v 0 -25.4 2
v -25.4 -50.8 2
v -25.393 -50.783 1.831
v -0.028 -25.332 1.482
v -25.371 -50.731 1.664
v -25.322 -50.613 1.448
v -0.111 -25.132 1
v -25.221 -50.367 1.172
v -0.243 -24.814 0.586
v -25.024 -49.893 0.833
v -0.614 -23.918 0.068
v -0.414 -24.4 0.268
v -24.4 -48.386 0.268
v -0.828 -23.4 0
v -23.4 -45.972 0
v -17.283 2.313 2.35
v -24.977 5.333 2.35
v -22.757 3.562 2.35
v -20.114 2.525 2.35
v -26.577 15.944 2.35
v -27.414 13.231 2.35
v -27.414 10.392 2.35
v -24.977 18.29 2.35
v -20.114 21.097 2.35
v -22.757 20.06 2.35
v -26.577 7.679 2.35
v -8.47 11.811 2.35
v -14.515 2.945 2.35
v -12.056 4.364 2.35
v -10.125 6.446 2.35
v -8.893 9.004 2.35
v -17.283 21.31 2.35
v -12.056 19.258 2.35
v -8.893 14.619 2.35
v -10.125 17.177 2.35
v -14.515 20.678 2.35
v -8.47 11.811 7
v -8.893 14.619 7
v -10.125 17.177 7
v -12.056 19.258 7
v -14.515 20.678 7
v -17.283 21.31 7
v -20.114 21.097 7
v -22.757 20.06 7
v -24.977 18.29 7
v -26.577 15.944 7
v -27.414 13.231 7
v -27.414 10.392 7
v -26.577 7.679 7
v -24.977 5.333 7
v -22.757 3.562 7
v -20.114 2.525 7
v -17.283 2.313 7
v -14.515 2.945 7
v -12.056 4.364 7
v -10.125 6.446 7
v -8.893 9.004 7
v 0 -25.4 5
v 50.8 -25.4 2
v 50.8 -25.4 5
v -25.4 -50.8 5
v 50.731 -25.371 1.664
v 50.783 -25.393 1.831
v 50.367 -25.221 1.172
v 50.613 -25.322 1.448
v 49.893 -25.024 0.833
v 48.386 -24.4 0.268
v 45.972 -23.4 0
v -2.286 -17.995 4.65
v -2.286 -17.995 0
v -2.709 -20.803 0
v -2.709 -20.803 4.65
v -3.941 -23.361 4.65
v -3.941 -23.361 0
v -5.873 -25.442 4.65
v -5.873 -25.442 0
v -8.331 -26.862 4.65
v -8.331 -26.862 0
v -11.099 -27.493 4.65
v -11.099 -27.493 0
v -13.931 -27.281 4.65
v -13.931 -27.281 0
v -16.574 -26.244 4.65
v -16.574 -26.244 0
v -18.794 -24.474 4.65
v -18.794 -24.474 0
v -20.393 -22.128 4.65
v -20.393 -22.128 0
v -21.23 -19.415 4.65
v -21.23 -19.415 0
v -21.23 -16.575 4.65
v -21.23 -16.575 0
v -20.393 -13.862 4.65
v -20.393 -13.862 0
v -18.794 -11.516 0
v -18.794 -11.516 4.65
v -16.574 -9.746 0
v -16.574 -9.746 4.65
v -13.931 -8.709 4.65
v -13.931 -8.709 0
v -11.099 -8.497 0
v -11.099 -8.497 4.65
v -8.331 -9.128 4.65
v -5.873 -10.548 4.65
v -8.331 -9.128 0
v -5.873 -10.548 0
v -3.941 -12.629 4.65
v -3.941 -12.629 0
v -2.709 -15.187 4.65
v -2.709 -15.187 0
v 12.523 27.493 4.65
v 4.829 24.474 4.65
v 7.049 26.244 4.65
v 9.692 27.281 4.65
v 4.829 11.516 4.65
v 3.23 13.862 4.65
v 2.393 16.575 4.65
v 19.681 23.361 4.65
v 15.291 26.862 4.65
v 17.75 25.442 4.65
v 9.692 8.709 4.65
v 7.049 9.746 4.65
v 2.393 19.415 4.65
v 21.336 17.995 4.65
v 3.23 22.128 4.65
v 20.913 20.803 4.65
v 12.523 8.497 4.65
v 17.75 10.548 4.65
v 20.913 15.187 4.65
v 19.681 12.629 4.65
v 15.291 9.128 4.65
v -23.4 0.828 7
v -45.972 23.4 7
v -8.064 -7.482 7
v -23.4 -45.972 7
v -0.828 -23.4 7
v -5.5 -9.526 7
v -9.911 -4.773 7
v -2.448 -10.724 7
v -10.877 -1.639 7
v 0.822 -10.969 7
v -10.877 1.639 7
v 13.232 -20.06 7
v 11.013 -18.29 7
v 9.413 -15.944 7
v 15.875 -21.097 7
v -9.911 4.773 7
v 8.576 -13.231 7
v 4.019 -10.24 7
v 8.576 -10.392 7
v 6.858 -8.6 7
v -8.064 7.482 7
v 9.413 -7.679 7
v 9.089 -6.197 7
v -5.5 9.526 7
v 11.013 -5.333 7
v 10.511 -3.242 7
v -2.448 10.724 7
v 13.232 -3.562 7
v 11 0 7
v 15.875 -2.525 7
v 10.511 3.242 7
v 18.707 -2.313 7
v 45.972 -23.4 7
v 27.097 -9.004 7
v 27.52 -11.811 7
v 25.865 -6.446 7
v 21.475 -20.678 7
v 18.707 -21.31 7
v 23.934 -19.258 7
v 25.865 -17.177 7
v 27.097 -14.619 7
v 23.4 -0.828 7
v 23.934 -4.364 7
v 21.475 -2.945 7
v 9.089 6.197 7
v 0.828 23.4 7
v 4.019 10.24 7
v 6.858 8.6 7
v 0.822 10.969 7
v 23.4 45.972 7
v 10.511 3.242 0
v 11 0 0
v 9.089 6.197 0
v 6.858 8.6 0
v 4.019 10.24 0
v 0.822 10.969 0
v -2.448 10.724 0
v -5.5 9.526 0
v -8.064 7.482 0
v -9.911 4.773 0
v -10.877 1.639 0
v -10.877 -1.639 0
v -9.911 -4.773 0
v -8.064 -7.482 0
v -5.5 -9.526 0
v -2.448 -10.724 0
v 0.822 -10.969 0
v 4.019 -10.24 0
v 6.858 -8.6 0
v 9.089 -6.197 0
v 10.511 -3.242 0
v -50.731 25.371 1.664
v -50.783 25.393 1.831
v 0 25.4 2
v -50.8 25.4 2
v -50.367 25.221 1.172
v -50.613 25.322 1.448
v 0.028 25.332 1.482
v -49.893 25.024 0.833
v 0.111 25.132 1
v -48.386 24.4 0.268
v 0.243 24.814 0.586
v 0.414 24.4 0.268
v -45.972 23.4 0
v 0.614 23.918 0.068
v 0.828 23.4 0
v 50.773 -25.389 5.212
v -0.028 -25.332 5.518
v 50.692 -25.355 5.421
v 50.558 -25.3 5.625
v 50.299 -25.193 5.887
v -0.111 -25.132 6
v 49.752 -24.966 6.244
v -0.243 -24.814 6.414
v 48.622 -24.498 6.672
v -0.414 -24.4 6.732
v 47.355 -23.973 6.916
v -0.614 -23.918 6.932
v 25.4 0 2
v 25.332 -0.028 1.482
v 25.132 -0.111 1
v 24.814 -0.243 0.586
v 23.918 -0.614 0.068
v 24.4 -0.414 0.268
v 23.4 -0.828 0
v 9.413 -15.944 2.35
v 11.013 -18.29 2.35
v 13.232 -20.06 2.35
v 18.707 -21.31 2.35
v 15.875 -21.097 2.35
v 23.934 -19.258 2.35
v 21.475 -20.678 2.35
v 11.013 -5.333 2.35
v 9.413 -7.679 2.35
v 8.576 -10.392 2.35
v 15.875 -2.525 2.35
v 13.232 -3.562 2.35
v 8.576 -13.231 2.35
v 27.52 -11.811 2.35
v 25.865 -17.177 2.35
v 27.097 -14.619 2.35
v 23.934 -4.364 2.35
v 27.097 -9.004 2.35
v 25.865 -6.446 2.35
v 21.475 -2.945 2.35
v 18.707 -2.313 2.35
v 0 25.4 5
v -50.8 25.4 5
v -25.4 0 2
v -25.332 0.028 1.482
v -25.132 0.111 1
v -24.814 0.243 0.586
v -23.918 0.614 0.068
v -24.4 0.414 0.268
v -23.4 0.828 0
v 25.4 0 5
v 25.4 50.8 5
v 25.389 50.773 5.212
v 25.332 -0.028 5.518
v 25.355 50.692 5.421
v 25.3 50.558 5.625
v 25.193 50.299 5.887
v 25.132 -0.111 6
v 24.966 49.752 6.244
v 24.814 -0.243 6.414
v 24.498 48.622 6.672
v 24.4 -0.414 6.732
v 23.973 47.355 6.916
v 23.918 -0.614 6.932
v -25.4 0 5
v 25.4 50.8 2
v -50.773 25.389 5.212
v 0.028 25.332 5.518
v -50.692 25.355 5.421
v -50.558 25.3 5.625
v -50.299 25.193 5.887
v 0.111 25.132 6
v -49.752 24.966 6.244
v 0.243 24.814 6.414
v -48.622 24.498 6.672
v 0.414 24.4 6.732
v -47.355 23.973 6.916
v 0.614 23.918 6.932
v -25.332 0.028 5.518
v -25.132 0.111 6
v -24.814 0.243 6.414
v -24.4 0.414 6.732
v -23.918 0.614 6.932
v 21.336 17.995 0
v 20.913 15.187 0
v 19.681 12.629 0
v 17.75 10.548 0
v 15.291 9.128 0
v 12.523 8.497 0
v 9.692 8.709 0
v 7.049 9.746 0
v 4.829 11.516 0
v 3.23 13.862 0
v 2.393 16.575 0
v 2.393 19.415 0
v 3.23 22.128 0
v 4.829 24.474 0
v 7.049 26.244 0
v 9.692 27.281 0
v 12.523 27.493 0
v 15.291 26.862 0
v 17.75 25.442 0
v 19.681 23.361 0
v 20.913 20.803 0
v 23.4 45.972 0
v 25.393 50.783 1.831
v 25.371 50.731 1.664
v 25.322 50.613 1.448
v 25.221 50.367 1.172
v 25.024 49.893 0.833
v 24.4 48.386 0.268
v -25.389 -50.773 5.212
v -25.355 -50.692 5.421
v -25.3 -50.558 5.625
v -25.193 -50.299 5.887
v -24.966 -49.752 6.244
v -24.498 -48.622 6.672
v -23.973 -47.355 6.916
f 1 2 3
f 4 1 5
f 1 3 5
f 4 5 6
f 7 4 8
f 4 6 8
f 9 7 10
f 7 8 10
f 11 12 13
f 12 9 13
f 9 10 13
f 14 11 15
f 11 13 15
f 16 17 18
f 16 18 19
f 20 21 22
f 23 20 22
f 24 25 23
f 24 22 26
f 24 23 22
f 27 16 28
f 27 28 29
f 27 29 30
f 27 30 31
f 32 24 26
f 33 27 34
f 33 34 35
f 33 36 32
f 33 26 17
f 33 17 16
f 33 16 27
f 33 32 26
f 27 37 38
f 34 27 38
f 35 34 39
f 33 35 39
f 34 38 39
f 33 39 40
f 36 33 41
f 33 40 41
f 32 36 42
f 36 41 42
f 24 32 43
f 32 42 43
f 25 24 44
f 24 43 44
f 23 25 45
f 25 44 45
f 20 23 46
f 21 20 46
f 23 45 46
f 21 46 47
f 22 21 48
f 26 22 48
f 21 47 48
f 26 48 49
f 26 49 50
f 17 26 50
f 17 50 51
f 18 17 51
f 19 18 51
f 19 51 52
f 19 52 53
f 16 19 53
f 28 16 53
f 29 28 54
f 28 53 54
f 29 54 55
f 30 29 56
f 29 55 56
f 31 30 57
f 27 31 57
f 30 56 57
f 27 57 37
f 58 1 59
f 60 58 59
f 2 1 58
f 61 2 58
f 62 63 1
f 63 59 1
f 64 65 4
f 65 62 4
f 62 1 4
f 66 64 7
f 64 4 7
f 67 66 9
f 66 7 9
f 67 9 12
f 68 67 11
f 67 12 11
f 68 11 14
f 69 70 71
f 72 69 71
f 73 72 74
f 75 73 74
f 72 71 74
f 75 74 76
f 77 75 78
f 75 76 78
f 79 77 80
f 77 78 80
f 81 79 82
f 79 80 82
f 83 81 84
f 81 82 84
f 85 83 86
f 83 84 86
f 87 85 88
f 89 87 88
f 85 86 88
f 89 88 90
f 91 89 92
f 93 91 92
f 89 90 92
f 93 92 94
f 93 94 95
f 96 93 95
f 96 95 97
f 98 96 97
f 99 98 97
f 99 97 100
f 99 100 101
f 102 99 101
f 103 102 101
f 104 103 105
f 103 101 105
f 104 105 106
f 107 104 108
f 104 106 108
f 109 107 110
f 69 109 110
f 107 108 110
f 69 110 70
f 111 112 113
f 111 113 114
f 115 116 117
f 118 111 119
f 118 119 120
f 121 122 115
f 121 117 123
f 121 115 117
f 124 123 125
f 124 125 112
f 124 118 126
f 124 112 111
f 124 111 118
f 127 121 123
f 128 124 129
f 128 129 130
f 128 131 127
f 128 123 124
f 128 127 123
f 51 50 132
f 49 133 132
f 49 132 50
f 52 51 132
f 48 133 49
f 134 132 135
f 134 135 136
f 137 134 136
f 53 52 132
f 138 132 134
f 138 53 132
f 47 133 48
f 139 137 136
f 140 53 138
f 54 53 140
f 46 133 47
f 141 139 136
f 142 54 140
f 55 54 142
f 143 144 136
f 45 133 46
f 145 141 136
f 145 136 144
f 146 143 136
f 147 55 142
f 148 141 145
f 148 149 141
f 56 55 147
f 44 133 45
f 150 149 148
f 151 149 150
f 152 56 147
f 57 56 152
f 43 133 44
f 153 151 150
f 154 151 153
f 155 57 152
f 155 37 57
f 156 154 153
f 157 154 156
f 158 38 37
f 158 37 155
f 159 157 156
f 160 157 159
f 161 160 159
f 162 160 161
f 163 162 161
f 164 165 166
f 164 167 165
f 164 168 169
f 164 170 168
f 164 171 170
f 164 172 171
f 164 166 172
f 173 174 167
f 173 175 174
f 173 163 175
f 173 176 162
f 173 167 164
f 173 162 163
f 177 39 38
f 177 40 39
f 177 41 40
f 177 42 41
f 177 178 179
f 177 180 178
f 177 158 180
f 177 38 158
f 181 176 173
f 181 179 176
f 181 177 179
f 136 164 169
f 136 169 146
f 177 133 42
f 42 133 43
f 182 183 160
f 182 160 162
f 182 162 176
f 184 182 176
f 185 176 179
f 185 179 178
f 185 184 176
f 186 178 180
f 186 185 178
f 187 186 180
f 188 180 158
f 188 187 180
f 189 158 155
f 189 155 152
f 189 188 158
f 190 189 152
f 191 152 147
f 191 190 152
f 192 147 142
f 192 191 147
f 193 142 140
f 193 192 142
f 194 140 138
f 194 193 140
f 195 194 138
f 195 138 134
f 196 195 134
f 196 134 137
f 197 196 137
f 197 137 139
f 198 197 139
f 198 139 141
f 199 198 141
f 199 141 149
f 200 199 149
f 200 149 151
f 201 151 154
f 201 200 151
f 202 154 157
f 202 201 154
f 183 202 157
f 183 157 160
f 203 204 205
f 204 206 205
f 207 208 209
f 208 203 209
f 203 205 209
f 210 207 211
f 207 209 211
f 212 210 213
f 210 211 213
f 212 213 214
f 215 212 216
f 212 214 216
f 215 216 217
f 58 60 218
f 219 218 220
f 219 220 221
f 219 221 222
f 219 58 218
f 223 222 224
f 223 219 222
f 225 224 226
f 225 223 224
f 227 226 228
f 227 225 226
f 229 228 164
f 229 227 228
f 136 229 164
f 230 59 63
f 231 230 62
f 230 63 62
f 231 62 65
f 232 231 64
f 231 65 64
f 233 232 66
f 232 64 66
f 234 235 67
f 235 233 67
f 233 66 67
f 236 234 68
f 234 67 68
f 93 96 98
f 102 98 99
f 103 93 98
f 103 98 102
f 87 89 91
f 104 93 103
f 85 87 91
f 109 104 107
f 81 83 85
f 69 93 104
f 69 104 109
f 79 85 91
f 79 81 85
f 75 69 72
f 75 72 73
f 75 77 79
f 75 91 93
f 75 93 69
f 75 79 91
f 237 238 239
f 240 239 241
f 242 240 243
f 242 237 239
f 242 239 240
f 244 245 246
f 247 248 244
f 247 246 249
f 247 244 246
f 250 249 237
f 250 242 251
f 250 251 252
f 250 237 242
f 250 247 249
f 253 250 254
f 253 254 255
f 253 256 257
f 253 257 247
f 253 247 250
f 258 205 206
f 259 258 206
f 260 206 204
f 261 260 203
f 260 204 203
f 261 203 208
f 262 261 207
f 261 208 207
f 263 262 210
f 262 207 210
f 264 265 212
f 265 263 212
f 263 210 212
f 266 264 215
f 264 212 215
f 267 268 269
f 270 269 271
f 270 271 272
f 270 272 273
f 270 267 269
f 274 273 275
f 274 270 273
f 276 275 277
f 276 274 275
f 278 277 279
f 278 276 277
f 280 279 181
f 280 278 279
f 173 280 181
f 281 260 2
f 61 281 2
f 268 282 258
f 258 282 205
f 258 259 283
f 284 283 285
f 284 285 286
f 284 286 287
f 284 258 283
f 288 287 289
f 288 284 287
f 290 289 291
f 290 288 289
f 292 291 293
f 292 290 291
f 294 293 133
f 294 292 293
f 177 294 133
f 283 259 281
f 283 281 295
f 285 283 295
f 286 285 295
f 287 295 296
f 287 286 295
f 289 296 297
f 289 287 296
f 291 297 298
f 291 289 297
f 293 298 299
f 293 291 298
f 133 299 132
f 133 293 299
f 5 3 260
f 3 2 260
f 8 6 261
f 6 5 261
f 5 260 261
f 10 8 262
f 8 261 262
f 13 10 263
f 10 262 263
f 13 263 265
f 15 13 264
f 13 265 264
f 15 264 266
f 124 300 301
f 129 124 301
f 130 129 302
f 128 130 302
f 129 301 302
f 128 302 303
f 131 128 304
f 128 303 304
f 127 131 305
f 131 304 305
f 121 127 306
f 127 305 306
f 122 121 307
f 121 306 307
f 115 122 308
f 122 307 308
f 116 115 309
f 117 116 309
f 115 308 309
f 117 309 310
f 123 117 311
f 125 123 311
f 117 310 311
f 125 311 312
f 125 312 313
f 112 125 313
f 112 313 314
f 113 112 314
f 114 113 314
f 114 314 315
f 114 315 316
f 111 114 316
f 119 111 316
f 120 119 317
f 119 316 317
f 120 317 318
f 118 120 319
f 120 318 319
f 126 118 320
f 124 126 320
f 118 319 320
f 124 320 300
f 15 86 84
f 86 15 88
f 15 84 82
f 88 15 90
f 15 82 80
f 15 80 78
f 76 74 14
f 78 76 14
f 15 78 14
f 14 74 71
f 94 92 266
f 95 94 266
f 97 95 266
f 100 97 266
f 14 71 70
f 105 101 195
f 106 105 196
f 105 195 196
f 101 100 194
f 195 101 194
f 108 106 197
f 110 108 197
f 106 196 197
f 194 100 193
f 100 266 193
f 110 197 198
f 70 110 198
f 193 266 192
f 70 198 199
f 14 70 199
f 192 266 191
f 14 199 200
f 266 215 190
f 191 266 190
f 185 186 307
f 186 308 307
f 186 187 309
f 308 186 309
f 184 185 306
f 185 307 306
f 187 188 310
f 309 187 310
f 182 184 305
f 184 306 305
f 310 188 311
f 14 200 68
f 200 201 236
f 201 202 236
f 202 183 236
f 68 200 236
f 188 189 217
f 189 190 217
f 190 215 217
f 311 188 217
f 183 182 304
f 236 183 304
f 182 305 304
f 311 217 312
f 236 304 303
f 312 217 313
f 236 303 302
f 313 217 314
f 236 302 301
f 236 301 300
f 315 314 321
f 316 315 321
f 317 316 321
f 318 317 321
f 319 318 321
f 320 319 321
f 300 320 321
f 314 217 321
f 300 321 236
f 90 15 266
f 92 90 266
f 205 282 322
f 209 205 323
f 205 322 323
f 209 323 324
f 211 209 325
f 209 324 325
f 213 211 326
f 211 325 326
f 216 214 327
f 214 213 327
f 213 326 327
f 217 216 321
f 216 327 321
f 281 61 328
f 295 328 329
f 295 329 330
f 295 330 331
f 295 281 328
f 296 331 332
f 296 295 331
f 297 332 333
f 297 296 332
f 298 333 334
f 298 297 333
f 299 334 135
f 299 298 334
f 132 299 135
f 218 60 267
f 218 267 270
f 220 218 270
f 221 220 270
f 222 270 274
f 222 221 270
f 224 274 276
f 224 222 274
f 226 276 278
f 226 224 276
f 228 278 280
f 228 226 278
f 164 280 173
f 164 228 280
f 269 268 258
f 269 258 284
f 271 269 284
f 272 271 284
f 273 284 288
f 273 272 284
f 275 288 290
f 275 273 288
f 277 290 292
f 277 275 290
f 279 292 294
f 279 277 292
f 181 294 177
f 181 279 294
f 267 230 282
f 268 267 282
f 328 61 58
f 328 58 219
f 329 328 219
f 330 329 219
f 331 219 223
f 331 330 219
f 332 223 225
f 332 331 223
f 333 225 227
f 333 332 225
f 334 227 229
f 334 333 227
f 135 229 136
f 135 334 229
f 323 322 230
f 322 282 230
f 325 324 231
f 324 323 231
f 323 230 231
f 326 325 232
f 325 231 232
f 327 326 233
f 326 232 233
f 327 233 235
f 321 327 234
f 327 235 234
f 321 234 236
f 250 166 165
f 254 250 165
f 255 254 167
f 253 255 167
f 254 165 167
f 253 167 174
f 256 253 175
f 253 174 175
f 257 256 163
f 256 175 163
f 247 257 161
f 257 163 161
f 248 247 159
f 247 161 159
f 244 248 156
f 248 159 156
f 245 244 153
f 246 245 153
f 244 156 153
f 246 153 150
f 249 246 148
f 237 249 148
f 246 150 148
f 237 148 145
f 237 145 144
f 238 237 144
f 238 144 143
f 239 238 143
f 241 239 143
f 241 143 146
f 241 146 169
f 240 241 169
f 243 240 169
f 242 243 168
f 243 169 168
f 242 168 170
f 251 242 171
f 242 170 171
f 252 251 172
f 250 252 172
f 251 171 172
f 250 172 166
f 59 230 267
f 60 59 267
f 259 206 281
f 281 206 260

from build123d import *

# Parameters (mm, degrees)
F0_R          = 11
F1_DEPTH      = 7
F2_T4_DEPTH   = 60.8
F2_T9_DEPTH   = 45.9210244843
F2_T14_DEPTH  = 45.9210244843
F2_T19_DEPTH  = 60.8
F2_T24_DEPTH  = 45.9210244843
F2_T29_DEPTH  = 60.8
F2_T34_DEPTH  = 45.9210244843
F2_T39_DEPTH  = 60.8
F2_T44_DEPTH  = 60.8
F2_T49_DEPTH  = 45.9210244843
F2_T54_DEPTH  = 60.8
F2_T59_DEPTH  = 45.9210244843
F2_T64_DEPTH  = 60.8
F2_T69_DEPTH  = 45.9210244843
F2_T74_DEPTH  = 60.8
F2_T79_DEPTH  = 45.9210244843
F2_T85_DEPTH  = 60.8
F2_T89_DEPTH  = 45.9210244843
F2_T96_DEPTH  = 45.9210244843
F2_T100_DEPTH = 60.8
F2_T107_DEPTH = 45.9210244843
F2_T111_DEPTH = 60.8
F2_T118_DEPTH = 45.9210244843
F2_T122_DEPTH = 60.8
F2_T129_DEPTH = 60.8
F2_T133_DEPTH = 45.9210244843
F2_T140_DEPTH = 45.9210244843
F2_T144_DEPTH = 60.8
F2_T151_DEPTH = 45.9210244843
F2_T155_DEPTH = 60.8
F2_T162_DEPTH = 45.9210244843
F2_T166_DEPTH = 60.8
F3_R          = 9.525
F4_DEPTH      = 4.65
F5_R          = 9.525
F6_DEPTH      = 4.65
F7_R          = 9.525
F8_DEPTH      = 4.65
F9_R          = 9.525
F10_DEPTH     = 4.65


# Not quite as in the source:
# - a fillet or chamfer that OpenCascade refuses, or shapes differently, is made with other operations: its cross-section is extruded or revolved along the edge and cut away or added


with BuildPart() as f1:
    # F0 (on Top) → F1 (new body)
    with BuildSketch(Plane.XY):
        Polygon((-25.4, -50.8), (0, -25.4), (-25.4, -25.4), align=None)
        Polygon((25.4, 0), (25.4, 25.4), (0, 25.4), (-25.4, 25.4), (-25.4, 0), (-25.4, -25.4), (0, -25.4), (25.4, -25.4), align=None)
        Circle(F0_R, mode=Mode.SUBTRACT)
        Polygon((0, 25.4), (25.4, 25.4), (25.4, 50.8), align=None)
        Polygon((50.8, -25.4), (25.4, 0), (25.4, -25.4), align=None)
        Polygon((-25.4, 0), (-25.4, 25.4), (-50.8, 25.4), align=None)
    extrude(amount=F1_DEPTH)

    # F2: fillet of radius 2 on 20 edges, made by hand


with BuildPart() as f2_tool2:
    # F2_s3 → F2_t4 (new body)
    with BuildSketch(Plane.YZ.offset(5)):
        with BuildLine():
            ThreePointArc((25.4, 5), (24.8142135624, 6.4142135624), (23.4, 7))
            Line((23.4, 7), (25.4, 7))
            Line((25.4, 7), (25.4, 5))
        make_face()
    extrude(amount=-F2_T4_DEPTH)

    split(bisect_by=Plane(origin=(-12.7, 12.7, 0), x_dir=(0, 0, 1), z_dir=(-0.7071067812, 0.7071067812, 0)), keep=Keep.TOP)


with BuildPart() as f1_1:
    add(f1.part)

    # F2_t1: cut F2_tool2
    add(f2_tool2.part, mode=Mode.SUBTRACT)


with BuildPart() as f2_tool7:
    # F2_s8 → F2_t9 (new body)
    with BuildSketch(Plane(origin=(41.6355339059, 41.6355339059, 0), x_dir=(0, 0, 1), z_dir=(-0.7071067812, -0.7071067812, 0))):
        with BuildLine():
            ThreePointArc((5, 17.9605122421), (6.4142135624, 17.3747258045), (7, 15.9605122421))
            Line((7, 15.9605122421), (7, 17.9605122421))
            Line((7, 17.9605122421), (5, 17.9605122421))
        make_face()
    extrude(amount=F2_T9_DEPTH)

    split(bisect_by=Plane.XZ.offset(-25.4), keep=Keep.BOTTOM)


with BuildPart() as f1_2:
    add(f1_1.part)

    # F2_t6: cut F2_tool7
    add(f2_tool7.part, mode=Mode.SUBTRACT)


with BuildPart() as f2_tool12:
    # F2_s13 → F2_t14 (new body)
    with BuildSketch(Plane(origin=(-41.6355339059, 41.6355339059, 0), x_dir=(0, 0, 1), z_dir=(0.7071067812, -0.7071067812, 0))):
        with BuildLine():
            ThreePointArc((5, 17.9605122421), (6.4142135624, 17.3747258045), (7, 15.9605122421))
            Line((7, 15.9605122421), (7, 17.9605122421))
            Line((7, 17.9605122421), (5, 17.9605122421))
        make_face()
    extrude(amount=F2_T14_DEPTH)

    split(bisect_by=Plane.YZ.offset(-25.4), keep=Keep.BOTTOM)


with BuildPart() as f1_3:
    add(f1_2.part)

    # F2_t11: cut F2_tool12
    add(f2_tool12.part, mode=Mode.SUBTRACT)


with BuildPart() as f2_tool17:
    # F2_s18 → F2_t19 (new body)
    with BuildSketch(Plane.XZ.offset(-5)):
        with BuildLine():
            ThreePointArc((-25.4, 5), (-24.8142135624, 6.4142135624), (-23.4, 7))
            Line((-23.4, 7), (-25.4, 7))
            Line((-25.4, 7), (-25.4, 5))
        make_face()
    extrude(amount=F2_T19_DEPTH)

    split(bisect_by=Plane(origin=(-12.7, -12.7, 0), x_dir=(0, 0, 1), z_dir=(-0.7071067812, -0.7071067812, 0)), keep=Keep.TOP)


with BuildPart() as f1_4:
    add(f1_3.part)

    # F2_t16: cut F2_tool17
    add(f2_tool17.part, mode=Mode.SUBTRACT)


with BuildPart() as f2_tool22:
    # F2_s23 → F2_t24 (new body)
    with BuildSketch(Plane(origin=(-41.6355339059, -41.6355339059, 0), x_dir=(0, 0, 1), z_dir=(0.7071067812, 0.7071067812, 0))):
        with BuildLine():
            ThreePointArc((5, 17.9605122421), (6.4142135624, 17.3747258045), (7, 15.9605122421))
            Line((7, 15.9605122421), (7, 17.9605122421))
            Line((7, 17.9605122421), (5, 17.9605122421))
        make_face()
    extrude(amount=F2_T24_DEPTH)

    split(bisect_by=Plane.XZ.offset(25.4), keep=Keep.TOP)


with BuildPart() as f1_5:
    add(f1_4.part)

    # F2_t21: cut F2_tool22
    add(f2_tool22.part, mode=Mode.SUBTRACT)


with BuildPart() as f2_tool27:
    # F2_s28 → F2_t29 (new body)
    with BuildSketch(Plane.YZ.offset(-5)):
        with BuildLine():
            ThreePointArc((-25.4, 5), (-24.8142135624, 6.4142135624), (-23.4, 7))
            Line((-23.4, 7), (-25.4, 7))
            Line((-25.4, 7), (-25.4, 5))
        make_face()
    extrude(amount=F2_T29_DEPTH)

    split(bisect_by=Plane(origin=(12.7, -12.7, 0), x_dir=(0, 0, 1), z_dir=(0.7071067812, -0.7071067812, 0)), keep=Keep.TOP)


with BuildPart() as f1_6:
    add(f1_5.part)

    # F2_t26: cut F2_tool27
    add(f2_tool27.part, mode=Mode.SUBTRACT)


with BuildPart() as f2_tool32:
    # F2_s33 → F2_t34 (new body)
    with BuildSketch(Plane(origin=(41.6355339059, -41.6355339059, 0), x_dir=(0, 0, 1), z_dir=(-0.7071067812, 0.7071067812, 0))):
        with BuildLine():
            ThreePointArc((5, 17.9605122421), (6.4142135624, 17.3747258045), (7, 15.9605122421))
            Line((7, 15.9605122421), (7, 17.9605122421))
            Line((7, 17.9605122421), (5, 17.9605122421))
        make_face()
    extrude(amount=F2_T34_DEPTH)

    split(bisect_by=Plane.YZ.offset(25.4), keep=Keep.TOP)


with BuildPart() as f1_7:
    add(f1_6.part)

    # F2_t31: cut F2_tool32
    add(f2_tool32.part, mode=Mode.SUBTRACT)


with BuildPart() as f2_tool37:
    # F2_s38 → F2_t39 (new body)
    with BuildSketch(Plane.XZ.offset(5)):
        with BuildLine():
            ThreePointArc((25.4, 5), (24.8142135624, 6.4142135624), (23.4, 7))
            Line((23.4, 7), (25.4, 7))
            Line((25.4, 7), (25.4, 5))
        make_face()
    extrude(amount=-F2_T39_DEPTH)

    split(bisect_by=Plane(origin=(12.7, 12.7, 0), x_dir=(0, 0, 1), z_dir=(0.7071067812, 0.7071067812, 0)), keep=Keep.TOP)


with BuildPart() as f1_8:
    add(f1_7.part)

    # F2_t36: cut F2_tool37
    add(f2_tool37.part, mode=Mode.SUBTRACT)


with BuildPart() as f2_tool42:
    # F2_s43 → F2_t44 (new body)
    with BuildSketch(Plane.YZ.offset(5)):
        with BuildLine():
            ThreePointArc((25.4, 2), (24.8142135624, 0.5857864376), (23.4, 0))
            Line((23.4, 0), (25.4, 0))
            Line((25.4, 0), (25.4, 2))
        make_face()
    extrude(amount=-F2_T44_DEPTH)

    split(bisect_by=Plane(origin=(-12.7, 12.7, 0), x_dir=(0, 0, 1), z_dir=(-0.7071067812, 0.7071067812, 0)), keep=Keep.TOP)


with BuildPart() as f1_9:
    add(f1_8.part)

    # F2_t41: cut F2_tool42
    add(f2_tool42.part, mode=Mode.SUBTRACT)


with BuildPart() as f2_tool47:
    # F2_s48 → F2_t49 (new body)
    with BuildSketch(Plane(origin=(41.6355339059, 41.6355339059, 0), x_dir=(0, 0, 1), z_dir=(-0.7071067812, -0.7071067812, 0))):
        with BuildLine():
            ThreePointArc((2, 17.9605122421), (0.5857864376, 17.3747258045), (0, 15.9605122421))
            Line((0, 15.9605122421), (0, 17.9605122421))
            Line((0, 17.9605122421), (2, 17.9605122421))
        make_face()
    extrude(amount=F2_T49_DEPTH)

    split(bisect_by=Plane.XZ.offset(-25.4), keep=Keep.BOTTOM)


with BuildPart() as f1_10:
    add(f1_9.part)

    # F2_t46: cut F2_tool47
    add(f2_tool47.part, mode=Mode.SUBTRACT)


with BuildPart() as f2_tool52:
    # F2_s53 → F2_t54 (new body)
    with BuildSketch(Plane.XZ.offset(5)):
        with BuildLine():
            ThreePointArc((25.4, 2), (24.8142135624, 0.5857864376), (23.4, 0))
            Line((23.4, 0), (25.4, 0))
            Line((25.4, 0), (25.4, 2))
        make_face()
    extrude(amount=-F2_T54_DEPTH)

    split(bisect_by=Plane(origin=(12.7, 12.7, 0), x_dir=(0, 0, 1), z_dir=(0.7071067812, 0.7071067812, 0)), keep=Keep.TOP)


with BuildPart() as f1_11:
    add(f1_10.part)

    # F2_t51: cut F2_tool52
    add(f2_tool52.part, mode=Mode.SUBTRACT)


with BuildPart() as f2_tool57:
    # F2_s58 → F2_t59 (new body)
    with BuildSketch(Plane(origin=(41.6355339059, -41.6355339059, 0), x_dir=(0, 0, 1), z_dir=(-0.7071067812, 0.7071067812, 0))):
        with BuildLine():
            ThreePointArc((2, 17.9605122421), (0.5857864376, 17.3747258045), (0, 15.9605122421))
            Line((0, 15.9605122421), (0, 17.9605122421))
            Line((0, 17.9605122421), (2, 17.9605122421))
        make_face()
    extrude(amount=F2_T59_DEPTH)

    split(bisect_by=Plane.YZ.offset(25.4), keep=Keep.TOP)


with BuildPart() as f1_12:
    add(f1_11.part)

    # F2_t56: cut F2_tool57
    add(f2_tool57.part, mode=Mode.SUBTRACT)


with BuildPart() as f2_tool62:
    # F2_s63 → F2_t64 (new body)
    with BuildSketch(Plane.YZ.offset(-5)):
        with BuildLine():
            ThreePointArc((-25.4, 2), (-24.8142135624, 0.5857864376), (-23.4, 0))
            Line((-23.4, 0), (-25.4, 0))
            Line((-25.4, 0), (-25.4, 2))
        make_face()
    extrude(amount=F2_T64_DEPTH)

    split(bisect_by=Plane(origin=(12.7, -12.7, 0), x_dir=(0, 0, 1), z_dir=(0.7071067812, -0.7071067812, 0)), keep=Keep.TOP)


with BuildPart() as f1_13:
    add(f1_12.part)

    # F2_t61: cut F2_tool62
    add(f2_tool62.part, mode=Mode.SUBTRACT)


with BuildPart() as f2_tool67:
    # F2_s68 → F2_t69 (new body)
    with BuildSketch(Plane(origin=(-41.6355339059, -41.6355339059, 0), x_dir=(0, 0, 1), z_dir=(0.7071067812, 0.7071067812, 0))):
        with BuildLine():
            ThreePointArc((2, 17.9605122421), (0.5857864376, 17.3747258045), (0, 15.9605122421))
            Line((0, 15.9605122421), (0, 17.9605122421))
            Line((0, 17.9605122421), (2, 17.9605122421))
        make_face()
    extrude(amount=F2_T69_DEPTH)

    split(bisect_by=Plane.XZ.offset(25.4), keep=Keep.TOP)


with BuildPart() as f1_14:
    add(f1_13.part)

    # F2_t66: cut F2_tool67
    add(f2_tool67.part, mode=Mode.SUBTRACT)


with BuildPart() as f2_tool72:
    # F2_s73 → F2_t74 (new body)
    with BuildSketch(Plane.XZ.offset(-5)):
        with BuildLine():
            ThreePointArc((-25.4, 2), (-24.8142135624, 0.5857864376), (-23.4, 0))
            Line((-23.4, 0), (-25.4, 0))
            Line((-25.4, 0), (-25.4, 2))
        make_face()
    extrude(amount=F2_T74_DEPTH)

    split(bisect_by=Plane(origin=(-12.7, -12.7, 0), x_dir=(0, 0, 1), z_dir=(-0.7071067812, -0.7071067812, 0)), keep=Keep.TOP)


with BuildPart() as f1_15:
    add(f1_14.part)

    # F2_t71: cut F2_tool72
    add(f2_tool72.part, mode=Mode.SUBTRACT)


with BuildPart() as f2_tool77:
    # F2_s78 → F2_t79 (new body)
    with BuildSketch(Plane(origin=(-41.6355339059, 41.6355339059, 0), x_dir=(0, 0, 1), z_dir=(0.7071067812, -0.7071067812, 0))):
        with BuildLine():
            ThreePointArc((2, 17.9605122421), (0.5857864376, 17.3747258045), (0, 15.9605122421))
            Line((0, 15.9605122421), (0, 17.9605122421))
            Line((0, 17.9605122421), (2, 17.9605122421))
        make_face()
    extrude(amount=F2_T79_DEPTH)

    split(bisect_by=Plane.YZ.offset(-25.4), keep=Keep.BOTTOM)


with BuildPart() as f1_16:
    add(f1_15.part)

    # F2_t76: cut F2_tool77
    add(f2_tool77.part, mode=Mode.SUBTRACT)


with BuildPart() as f2_tool83:
    # F2_s84 → F2_t85 (new body)
    with BuildSketch(Plane.YZ.offset(5)):
        with BuildLine():
            ThreePointArc((25.4, 5), (24.8142135624, 6.4142135624), (23.4, 7))
            Line((23.4, 7), (25.4, 7))
            Line((25.4, 7), (25.4, 5))
        make_face()
    extrude(amount=-F2_T85_DEPTH)

    split(bisect_by=Plane(origin=(-12.7, 12.7, 0), x_dir=(0, 0, 1), z_dir=(0.7071067812, -0.7071067812, 0)), keep=Keep.TOP)


with BuildPart() as f2_tool87:
    # F2_s88 → F2_t89 (new body)
    with BuildSketch(Plane(origin=(41.6355339059, 41.6355339059, 0), x_dir=(0, 0, 1), z_dir=(-0.7071067812, -0.7071067812, 0))):
        with BuildLine():
            ThreePointArc((5, 17.9605122421), (6.4142135624, 17.3747258045), (7, 15.9605122421))
            Line((7, 15.9605122421), (7, 17.9605122421))
            Line((7, 17.9605122421), (5, 17.9605122421))
        make_face()
    extrude(amount=F2_T89_DEPTH)

    split(bisect_by=Plane.XZ.offset(-25.4), keep=Keep.TOP)


with BuildPart() as f2_tool83_1:
    add(f2_tool83.part)

    # F2_t91: intersect F2_tool87
    add(f2_tool87.part, mode=Mode.INTERSECT)


with BuildPart() as f1_17:
    add(f1_16.part)

    # F2_t81: cut F2_tool83
    add(f2_tool83_1.part, mode=Mode.SUBTRACT)


with BuildPart() as f2_tool94:
    # F2_s95 → F2_t96 (new body)
    with BuildSketch(Plane(origin=(-41.6355339059, 41.6355339059, 0), x_dir=(0, 0, 1), z_dir=(0.7071067812, -0.7071067812, 0))):
        with BuildLine():
            ThreePointArc((5, 17.9605122421), (6.4142135624, 17.3747258045), (7, 15.9605122421))
            Line((7, 15.9605122421), (7, 17.9605122421))
            Line((7, 17.9605122421), (5, 17.9605122421))
        make_face()
    extrude(amount=F2_T96_DEPTH)

    split(bisect_by=Plane.YZ.offset(-25.4), keep=Keep.TOP)


with BuildPart() as f2_tool98:
    # F2_s99 → F2_t100 (new body)
    with BuildSketch(Plane.XZ.offset(-5)):
        with BuildLine():
            ThreePointArc((-25.4, 5), (-24.8142135624, 6.4142135624), (-23.4, 7))
            Line((-23.4, 7), (-25.4, 7))
            Line((-25.4, 7), (-25.4, 5))
        make_face()
    extrude(amount=F2_T100_DEPTH)

    split(bisect_by=Plane(origin=(-12.7, -12.7, 0), x_dir=(0, 0, 1), z_dir=(0.7071067812, 0.7071067812, 0)), keep=Keep.TOP)


with BuildPart() as f2_tool94_1:
    add(f2_tool94.part)

    # F2_t102: intersect F2_tool98
    add(f2_tool98.part, mode=Mode.INTERSECT)


with BuildPart() as f1_18:
    add(f1_17.part)

    # F2_t92: cut F2_tool94
    add(f2_tool94_1.part, mode=Mode.SUBTRACT)


with BuildPart() as f2_tool105:
    # F2_s106 → F2_t107 (new body)
    with BuildSketch(Plane(origin=(-41.6355339059, -41.6355339059, 0), x_dir=(0, 0, 1), z_dir=(0.7071067812, 0.7071067812, 0))):
        with BuildLine():
            ThreePointArc((5, 17.9605122421), (6.4142135624, 17.3747258045), (7, 15.9605122421))
            Line((7, 15.9605122421), (7, 17.9605122421))
            Line((7, 17.9605122421), (5, 17.9605122421))
        make_face()
    extrude(amount=F2_T107_DEPTH)

    split(bisect_by=Plane.XZ.offset(25.4), keep=Keep.BOTTOM)


with BuildPart() as f2_tool109:
    # F2_s110 → F2_t111 (new body)
    with BuildSketch(Plane.YZ.offset(-5)):
        with BuildLine():
            ThreePointArc((-25.4, 5), (-24.8142135624, 6.4142135624), (-23.4, 7))
            Line((-23.4, 7), (-25.4, 7))
            Line((-25.4, 7), (-25.4, 5))
        make_face()
    extrude(amount=F2_T111_DEPTH)

    split(bisect_by=Plane(origin=(12.7, -12.7, 0), x_dir=(0, 0, 1), z_dir=(-0.7071067812, 0.7071067812, 0)), keep=Keep.TOP)


with BuildPart() as f2_tool105_1:
    add(f2_tool105.part)

    # F2_t113: intersect F2_tool109
    add(f2_tool109.part, mode=Mode.INTERSECT)


with BuildPart() as f1_19:
    add(f1_18.part)

    # F2_t103: cut F2_tool105
    add(f2_tool105_1.part, mode=Mode.SUBTRACT)


with BuildPart() as f2_tool116:
    # F2_s117 → F2_t118 (new body)
    with BuildSketch(Plane(origin=(41.6355339059, -41.6355339059, 0), x_dir=(0, 0, 1), z_dir=(-0.7071067812, 0.7071067812, 0))):
        with BuildLine():
            ThreePointArc((5, 17.9605122421), (6.4142135624, 17.3747258045), (7, 15.9605122421))
            Line((7, 15.9605122421), (7, 17.9605122421))
            Line((7, 17.9605122421), (5, 17.9605122421))
        make_face()
    extrude(amount=F2_T118_DEPTH)

    split(bisect_by=Plane.YZ.offset(25.4), keep=Keep.BOTTOM)


with BuildPart() as f2_tool120:
    # F2_s121 → F2_t122 (new body)
    with BuildSketch(Plane.XZ.offset(5)):
        with BuildLine():
            ThreePointArc((25.4, 5), (24.8142135624, 6.4142135624), (23.4, 7))
            Line((23.4, 7), (25.4, 7))
            Line((25.4, 7), (25.4, 5))
        make_face()
    extrude(amount=-F2_T122_DEPTH)

    split(bisect_by=Plane(origin=(12.7, 12.7, 0), x_dir=(0, 0, 1), z_dir=(-0.7071067812, -0.7071067812, 0)), keep=Keep.TOP)


with BuildPart() as f2_tool116_1:
    add(f2_tool116.part)

    # F2_t124: intersect F2_tool120
    add(f2_tool120.part, mode=Mode.INTERSECT)


with BuildPart() as f1_20:
    add(f1_19.part)

    # F2_t114: cut F2_tool116
    add(f2_tool116_1.part, mode=Mode.SUBTRACT)


with BuildPart() as f2_tool127:
    # F2_s128 → F2_t129 (new body)
    with BuildSketch(Plane.YZ.offset(5)):
        with BuildLine():
            ThreePointArc((25.4, 2), (24.8142135624, 0.5857864376), (23.4, 0))
            Line((23.4, 0), (25.4, 0))
            Line((25.4, 0), (25.4, 2))
        make_face()
    extrude(amount=-F2_T129_DEPTH)

    split(bisect_by=Plane(origin=(-12.7, 12.7, 0), x_dir=(0, 0, 1), z_dir=(0.7071067812, -0.7071067812, 0)), keep=Keep.TOP)


with BuildPart() as f2_tool131:
    # F2_s132 → F2_t133 (new body)
    with BuildSketch(Plane(origin=(41.6355339059, 41.6355339059, 0), x_dir=(0, 0, 1), z_dir=(-0.7071067812, -0.7071067812, 0))):
        with BuildLine():
            ThreePointArc((2, 17.9605122421), (0.5857864376, 17.3747258045), (0, 15.9605122421))
            Line((0, 15.9605122421), (0, 17.9605122421))
            Line((0, 17.9605122421), (2, 17.9605122421))
        make_face()
    extrude(amount=F2_T133_DEPTH)

    split(bisect_by=Plane.XZ.offset(-25.4), keep=Keep.TOP)


with BuildPart() as f2_tool127_1:
    add(f2_tool127.part)

    # F2_t135: intersect F2_tool131
    add(f2_tool131.part, mode=Mode.INTERSECT)


with BuildPart() as f1_21:
    add(f1_20.part)

    # F2_t125: cut F2_tool127
    add(f2_tool127_1.part, mode=Mode.SUBTRACT)


with BuildPart() as f2_tool138:
    # F2_s139 → F2_t140 (new body)
    with BuildSketch(Plane(origin=(41.6355339059, -41.6355339059, 0), x_dir=(0, 0, 1), z_dir=(-0.7071067812, 0.7071067812, 0))):
        with BuildLine():
            ThreePointArc((2, 17.9605122421), (0.5857864376, 17.3747258045), (0, 15.9605122421))
            Line((0, 15.9605122421), (0, 17.9605122421))
            Line((0, 17.9605122421), (2, 17.9605122421))
        make_face()
    extrude(amount=F2_T140_DEPTH)

    split(bisect_by=Plane.YZ.offset(25.4), keep=Keep.BOTTOM)


with BuildPart() as f2_tool142:
    # F2_s143 → F2_t144 (new body)
    with BuildSketch(Plane.XZ.offset(5)):
        with BuildLine():
            ThreePointArc((25.4, 2), (24.8142135624, 0.5857864376), (23.4, 0))
            Line((23.4, 0), (25.4, 0))
            Line((25.4, 0), (25.4, 2))
        make_face()
    extrude(amount=-F2_T144_DEPTH)

    split(bisect_by=Plane(origin=(12.7, 12.7, 0), x_dir=(0, 0, 1), z_dir=(-0.7071067812, -0.7071067812, 0)), keep=Keep.TOP)


with BuildPart() as f2_tool138_1:
    add(f2_tool138.part)

    # F2_t146: intersect F2_tool142
    add(f2_tool142.part, mode=Mode.INTERSECT)


with BuildPart() as f1_22:
    add(f1_21.part)

    # F2_t136: cut F2_tool138
    add(f2_tool138_1.part, mode=Mode.SUBTRACT)


with BuildPart() as f2_tool149:
    # F2_s150 → F2_t151 (new body)
    with BuildSketch(Plane(origin=(-41.6355339059, -41.6355339059, 0), x_dir=(0, 0, 1), z_dir=(0.7071067812, 0.7071067812, 0))):
        with BuildLine():
            ThreePointArc((2, 17.9605122421), (0.5857864376, 17.3747258045), (0, 15.9605122421))
            Line((0, 15.9605122421), (0, 17.9605122421))
            Line((0, 17.9605122421), (2, 17.9605122421))
        make_face()
    extrude(amount=F2_T151_DEPTH)

    split(bisect_by=Plane.XZ.offset(25.4), keep=Keep.BOTTOM)


with BuildPart() as f2_tool153:
    # F2_s154 → F2_t155 (new body)
    with BuildSketch(Plane.YZ.offset(-5)):
        with BuildLine():
            ThreePointArc((-25.4, 2), (-24.8142135624, 0.5857864376), (-23.4, 0))
            Line((-23.4, 0), (-25.4, 0))
            Line((-25.4, 0), (-25.4, 2))
        make_face()
    extrude(amount=F2_T155_DEPTH)

    split(bisect_by=Plane(origin=(12.7, -12.7, 0), x_dir=(0, 0, 1), z_dir=(-0.7071067812, 0.7071067812, 0)), keep=Keep.TOP)


with BuildPart() as f2_tool149_1:
    add(f2_tool149.part)

    # F2_t157: intersect F2_tool153
    add(f2_tool153.part, mode=Mode.INTERSECT)


with BuildPart() as f1_23:
    add(f1_22.part)

    # F2_t147: cut F2_tool149
    add(f2_tool149_1.part, mode=Mode.SUBTRACT)


with BuildPart() as f2_tool160:
    # F2_s161 → F2_t162 (new body)
    with BuildSketch(Plane(origin=(-41.6355339059, 41.6355339059, 0), x_dir=(0, 0, 1), z_dir=(0.7071067812, -0.7071067812, 0))):
        with BuildLine():
            ThreePointArc((2, 17.9605122421), (0.5857864376, 17.3747258045), (0, 15.9605122421))
            Line((0, 15.9605122421), (0, 17.9605122421))
            Line((0, 17.9605122421), (2, 17.9605122421))
        make_face()
    extrude(amount=F2_T162_DEPTH)

    split(bisect_by=Plane.YZ.offset(-25.4), keep=Keep.TOP)


with BuildPart() as f2_tool164:
    # F2_s165 → F2_t166 (new body)
    with BuildSketch(Plane.XZ.offset(-5)):
        with BuildLine():
            ThreePointArc((-25.4, 2), (-24.8142135624, 0.5857864376), (-23.4, 0))
            Line((-23.4, 0), (-25.4, 0))
            Line((-25.4, 0), (-25.4, 2))
        make_face()
    extrude(amount=F2_T166_DEPTH)

    split(bisect_by=Plane(origin=(-12.7, -12.7, 0), x_dir=(0, 0, 1), z_dir=(0.7071067812, 0.7071067812, 0)), keep=Keep.TOP)


with BuildPart() as f2_tool160_1:
    add(f2_tool160.part)

    # F2_t168: intersect F2_tool164
    add(f2_tool164.part, mode=Mode.INTERSECT)


with BuildPart() as f1_24:
    add(f1_23.part)

    # F2_t158: cut F2_tool160
    add(f2_tool160_1.part, mode=Mode.SUBTRACT)

    # F3 (on face) → F4 (cut)
    with BuildSketch(Plane.XY.offset(7)):
        with Locations((17.9949663132, -11.8113001988)):
            Circle(F3_R)
    extrude(amount=-F4_DEPTH, mode=Mode.SUBTRACT)

    # F5 (on face) → F6 (cut)
    with BuildSketch(Plane.XY.offset(7)):
        with Locations((-17.9949663132, 11.8113001988)):
            Circle(F5_R)
    extrude(amount=-F6_DEPTH, mode=Mode.SUBTRACT)

    # F7 (on face) → F8 (cut)
    with BuildSketch(Plane(origin=(0, 0, 0), x_dir=(1, 0, 0), z_dir=(0, 0, -1))):
        with Locations((-11.8113001988, 17.9949663132)):
            Circle(F7_R)
    extrude(amount=-F8_DEPTH, mode=Mode.SUBTRACT)

    # F9 (on face) → F10 (cut)
    with BuildSketch(Plane(origin=(0, 0, 0), x_dir=(1, 0, 0), z_dir=(0, 0, -1))):
        with Locations((11.8113001988, -17.9949663132)):
            Circle(F9_R)
    extrude(amount=-F10_DEPTH, mode=Mode.SUBTRACT)


solid = f1_24.part
